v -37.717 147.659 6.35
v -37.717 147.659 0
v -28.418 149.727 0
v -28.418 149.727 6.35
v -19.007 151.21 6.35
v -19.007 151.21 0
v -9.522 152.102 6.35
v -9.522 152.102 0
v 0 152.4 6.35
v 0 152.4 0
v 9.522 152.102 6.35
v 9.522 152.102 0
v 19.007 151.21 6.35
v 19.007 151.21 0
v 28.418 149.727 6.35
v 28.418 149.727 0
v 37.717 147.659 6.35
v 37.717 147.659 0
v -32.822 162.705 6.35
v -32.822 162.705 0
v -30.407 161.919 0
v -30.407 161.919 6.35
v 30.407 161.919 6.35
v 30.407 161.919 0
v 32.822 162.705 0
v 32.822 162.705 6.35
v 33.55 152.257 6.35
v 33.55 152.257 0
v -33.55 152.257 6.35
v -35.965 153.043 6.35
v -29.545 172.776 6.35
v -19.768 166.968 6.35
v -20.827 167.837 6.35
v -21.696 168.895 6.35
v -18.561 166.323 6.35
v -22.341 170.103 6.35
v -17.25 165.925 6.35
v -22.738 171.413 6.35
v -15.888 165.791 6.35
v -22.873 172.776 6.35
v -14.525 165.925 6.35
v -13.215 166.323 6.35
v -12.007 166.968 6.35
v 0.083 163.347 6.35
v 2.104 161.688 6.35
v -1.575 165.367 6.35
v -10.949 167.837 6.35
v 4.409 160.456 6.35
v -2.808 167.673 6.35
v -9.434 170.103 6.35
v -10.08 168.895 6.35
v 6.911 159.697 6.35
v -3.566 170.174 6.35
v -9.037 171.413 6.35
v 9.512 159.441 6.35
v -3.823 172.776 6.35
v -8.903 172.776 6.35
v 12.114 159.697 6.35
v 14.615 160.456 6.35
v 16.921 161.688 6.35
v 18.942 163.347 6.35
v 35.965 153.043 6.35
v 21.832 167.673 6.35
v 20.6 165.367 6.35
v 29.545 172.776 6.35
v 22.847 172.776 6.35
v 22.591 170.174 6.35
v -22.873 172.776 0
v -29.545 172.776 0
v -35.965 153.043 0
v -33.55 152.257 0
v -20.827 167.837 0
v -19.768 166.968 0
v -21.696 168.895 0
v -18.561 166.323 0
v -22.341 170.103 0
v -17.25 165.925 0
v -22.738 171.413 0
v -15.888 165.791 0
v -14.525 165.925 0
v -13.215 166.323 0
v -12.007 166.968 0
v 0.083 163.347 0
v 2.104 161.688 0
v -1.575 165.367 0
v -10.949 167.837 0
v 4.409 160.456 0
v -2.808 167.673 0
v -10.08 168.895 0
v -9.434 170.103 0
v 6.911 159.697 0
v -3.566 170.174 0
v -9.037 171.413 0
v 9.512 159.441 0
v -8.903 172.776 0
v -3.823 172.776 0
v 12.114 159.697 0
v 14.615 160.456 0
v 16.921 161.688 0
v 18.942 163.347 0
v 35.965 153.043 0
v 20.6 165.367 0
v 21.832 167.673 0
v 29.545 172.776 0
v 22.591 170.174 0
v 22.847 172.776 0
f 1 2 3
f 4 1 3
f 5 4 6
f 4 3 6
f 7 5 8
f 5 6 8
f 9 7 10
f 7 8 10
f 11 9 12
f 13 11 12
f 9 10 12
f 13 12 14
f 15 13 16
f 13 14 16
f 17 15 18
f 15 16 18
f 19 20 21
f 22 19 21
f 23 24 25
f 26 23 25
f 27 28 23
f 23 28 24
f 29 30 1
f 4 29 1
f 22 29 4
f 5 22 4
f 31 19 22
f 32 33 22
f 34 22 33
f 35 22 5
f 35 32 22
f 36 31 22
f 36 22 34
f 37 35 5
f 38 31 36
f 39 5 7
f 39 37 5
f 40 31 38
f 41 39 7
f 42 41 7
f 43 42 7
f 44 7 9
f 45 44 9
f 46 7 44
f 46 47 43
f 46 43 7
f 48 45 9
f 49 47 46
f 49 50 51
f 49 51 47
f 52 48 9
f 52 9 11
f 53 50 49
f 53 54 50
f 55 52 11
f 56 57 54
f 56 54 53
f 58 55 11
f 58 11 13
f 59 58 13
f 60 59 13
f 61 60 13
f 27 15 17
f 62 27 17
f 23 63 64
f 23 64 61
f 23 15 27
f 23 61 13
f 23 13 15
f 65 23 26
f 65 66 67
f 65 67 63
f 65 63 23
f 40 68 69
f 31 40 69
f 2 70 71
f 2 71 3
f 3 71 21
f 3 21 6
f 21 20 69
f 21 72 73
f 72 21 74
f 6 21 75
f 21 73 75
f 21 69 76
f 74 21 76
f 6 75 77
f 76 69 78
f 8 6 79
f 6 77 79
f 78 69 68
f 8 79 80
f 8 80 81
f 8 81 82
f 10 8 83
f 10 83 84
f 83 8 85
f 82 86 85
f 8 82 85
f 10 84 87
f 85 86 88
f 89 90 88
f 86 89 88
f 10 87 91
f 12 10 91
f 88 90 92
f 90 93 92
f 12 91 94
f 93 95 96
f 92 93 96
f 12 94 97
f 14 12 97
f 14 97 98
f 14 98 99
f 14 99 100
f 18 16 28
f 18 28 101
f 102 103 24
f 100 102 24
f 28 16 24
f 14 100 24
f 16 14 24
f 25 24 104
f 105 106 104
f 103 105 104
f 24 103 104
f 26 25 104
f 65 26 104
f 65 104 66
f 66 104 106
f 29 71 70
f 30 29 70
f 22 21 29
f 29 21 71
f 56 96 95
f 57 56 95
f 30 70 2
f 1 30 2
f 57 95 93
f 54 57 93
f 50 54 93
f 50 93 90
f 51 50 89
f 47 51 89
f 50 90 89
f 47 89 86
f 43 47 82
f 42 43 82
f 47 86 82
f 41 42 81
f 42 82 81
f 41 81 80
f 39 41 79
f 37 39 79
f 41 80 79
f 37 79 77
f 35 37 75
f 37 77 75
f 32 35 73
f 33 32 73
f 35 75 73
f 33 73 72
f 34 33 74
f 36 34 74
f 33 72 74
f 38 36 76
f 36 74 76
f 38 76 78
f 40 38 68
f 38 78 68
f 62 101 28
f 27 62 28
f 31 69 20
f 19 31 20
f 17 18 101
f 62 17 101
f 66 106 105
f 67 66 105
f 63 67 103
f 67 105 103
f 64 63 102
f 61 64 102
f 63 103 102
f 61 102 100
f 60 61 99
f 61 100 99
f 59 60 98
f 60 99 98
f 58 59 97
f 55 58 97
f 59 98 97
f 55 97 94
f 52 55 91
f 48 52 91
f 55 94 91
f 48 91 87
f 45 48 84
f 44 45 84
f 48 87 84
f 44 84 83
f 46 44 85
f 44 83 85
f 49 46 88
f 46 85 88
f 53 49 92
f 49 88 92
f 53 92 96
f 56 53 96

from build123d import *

# Parameters (mm, degrees)
BOSS_EXTRUDE2_DEPTH = 6.35


with BuildPart() as part:
    # Sketch1 → Boss-Extrude2 (new body)
    with BuildSketch(Plane.XY):
        with BuildLine():
            Line((37.717239544, 147.658964649), (35.965487423, 153.043027332))
            Line((35.965487423, 153.043027332), (33.550115758, 152.257164929))
            Line((33.550115758, 152.257164929), (30.406666146, 161.918651592))
            Line((30.406666146, 161.918651592), (32.822037812, 162.704513995))
            Line((32.822037812, 162.704513995), (29.545241798, 172.775844825))
            Line((29.545241798, 172.775844825), (22.8473, 172.775844825))
            ThreePointArc((22.8473, 172.775844825), (9.5123, 159.440844825), (-3.8227, 172.775844825))
            Line((-3.8227, 172.775844825), (-8.9027, 172.775844825))
            ThreePointArc((-8.9027, 172.775844825), (-15.8877, 165.790844825), (-22.8727, 172.775844825))
            Line((-22.8727, 172.775844825), (-29.545241798, 172.775844825))
            Line((-29.545241798, 172.775844825), (-32.822037812, 162.704513995))
            Line((-32.822037812, 162.704513995), (-30.406666146, 161.918651592))
            Line((-30.406666146, 161.918651592), (-33.550115758, 152.257164929))
            Line((-33.550115758, 152.257164929), (-35.965487423, 153.043027332))
            Line((-35.965487423, 153.043027332), (-37.717239544, 147.658964649))
            ThreePointArc((-37.717239544, 147.658964649), (0, 152.4), (37.717239544, 147.658964649))
        make_face()
    extrude(amount=BOSS_EXTRUDE2_DEPTH)


solid = part.part
